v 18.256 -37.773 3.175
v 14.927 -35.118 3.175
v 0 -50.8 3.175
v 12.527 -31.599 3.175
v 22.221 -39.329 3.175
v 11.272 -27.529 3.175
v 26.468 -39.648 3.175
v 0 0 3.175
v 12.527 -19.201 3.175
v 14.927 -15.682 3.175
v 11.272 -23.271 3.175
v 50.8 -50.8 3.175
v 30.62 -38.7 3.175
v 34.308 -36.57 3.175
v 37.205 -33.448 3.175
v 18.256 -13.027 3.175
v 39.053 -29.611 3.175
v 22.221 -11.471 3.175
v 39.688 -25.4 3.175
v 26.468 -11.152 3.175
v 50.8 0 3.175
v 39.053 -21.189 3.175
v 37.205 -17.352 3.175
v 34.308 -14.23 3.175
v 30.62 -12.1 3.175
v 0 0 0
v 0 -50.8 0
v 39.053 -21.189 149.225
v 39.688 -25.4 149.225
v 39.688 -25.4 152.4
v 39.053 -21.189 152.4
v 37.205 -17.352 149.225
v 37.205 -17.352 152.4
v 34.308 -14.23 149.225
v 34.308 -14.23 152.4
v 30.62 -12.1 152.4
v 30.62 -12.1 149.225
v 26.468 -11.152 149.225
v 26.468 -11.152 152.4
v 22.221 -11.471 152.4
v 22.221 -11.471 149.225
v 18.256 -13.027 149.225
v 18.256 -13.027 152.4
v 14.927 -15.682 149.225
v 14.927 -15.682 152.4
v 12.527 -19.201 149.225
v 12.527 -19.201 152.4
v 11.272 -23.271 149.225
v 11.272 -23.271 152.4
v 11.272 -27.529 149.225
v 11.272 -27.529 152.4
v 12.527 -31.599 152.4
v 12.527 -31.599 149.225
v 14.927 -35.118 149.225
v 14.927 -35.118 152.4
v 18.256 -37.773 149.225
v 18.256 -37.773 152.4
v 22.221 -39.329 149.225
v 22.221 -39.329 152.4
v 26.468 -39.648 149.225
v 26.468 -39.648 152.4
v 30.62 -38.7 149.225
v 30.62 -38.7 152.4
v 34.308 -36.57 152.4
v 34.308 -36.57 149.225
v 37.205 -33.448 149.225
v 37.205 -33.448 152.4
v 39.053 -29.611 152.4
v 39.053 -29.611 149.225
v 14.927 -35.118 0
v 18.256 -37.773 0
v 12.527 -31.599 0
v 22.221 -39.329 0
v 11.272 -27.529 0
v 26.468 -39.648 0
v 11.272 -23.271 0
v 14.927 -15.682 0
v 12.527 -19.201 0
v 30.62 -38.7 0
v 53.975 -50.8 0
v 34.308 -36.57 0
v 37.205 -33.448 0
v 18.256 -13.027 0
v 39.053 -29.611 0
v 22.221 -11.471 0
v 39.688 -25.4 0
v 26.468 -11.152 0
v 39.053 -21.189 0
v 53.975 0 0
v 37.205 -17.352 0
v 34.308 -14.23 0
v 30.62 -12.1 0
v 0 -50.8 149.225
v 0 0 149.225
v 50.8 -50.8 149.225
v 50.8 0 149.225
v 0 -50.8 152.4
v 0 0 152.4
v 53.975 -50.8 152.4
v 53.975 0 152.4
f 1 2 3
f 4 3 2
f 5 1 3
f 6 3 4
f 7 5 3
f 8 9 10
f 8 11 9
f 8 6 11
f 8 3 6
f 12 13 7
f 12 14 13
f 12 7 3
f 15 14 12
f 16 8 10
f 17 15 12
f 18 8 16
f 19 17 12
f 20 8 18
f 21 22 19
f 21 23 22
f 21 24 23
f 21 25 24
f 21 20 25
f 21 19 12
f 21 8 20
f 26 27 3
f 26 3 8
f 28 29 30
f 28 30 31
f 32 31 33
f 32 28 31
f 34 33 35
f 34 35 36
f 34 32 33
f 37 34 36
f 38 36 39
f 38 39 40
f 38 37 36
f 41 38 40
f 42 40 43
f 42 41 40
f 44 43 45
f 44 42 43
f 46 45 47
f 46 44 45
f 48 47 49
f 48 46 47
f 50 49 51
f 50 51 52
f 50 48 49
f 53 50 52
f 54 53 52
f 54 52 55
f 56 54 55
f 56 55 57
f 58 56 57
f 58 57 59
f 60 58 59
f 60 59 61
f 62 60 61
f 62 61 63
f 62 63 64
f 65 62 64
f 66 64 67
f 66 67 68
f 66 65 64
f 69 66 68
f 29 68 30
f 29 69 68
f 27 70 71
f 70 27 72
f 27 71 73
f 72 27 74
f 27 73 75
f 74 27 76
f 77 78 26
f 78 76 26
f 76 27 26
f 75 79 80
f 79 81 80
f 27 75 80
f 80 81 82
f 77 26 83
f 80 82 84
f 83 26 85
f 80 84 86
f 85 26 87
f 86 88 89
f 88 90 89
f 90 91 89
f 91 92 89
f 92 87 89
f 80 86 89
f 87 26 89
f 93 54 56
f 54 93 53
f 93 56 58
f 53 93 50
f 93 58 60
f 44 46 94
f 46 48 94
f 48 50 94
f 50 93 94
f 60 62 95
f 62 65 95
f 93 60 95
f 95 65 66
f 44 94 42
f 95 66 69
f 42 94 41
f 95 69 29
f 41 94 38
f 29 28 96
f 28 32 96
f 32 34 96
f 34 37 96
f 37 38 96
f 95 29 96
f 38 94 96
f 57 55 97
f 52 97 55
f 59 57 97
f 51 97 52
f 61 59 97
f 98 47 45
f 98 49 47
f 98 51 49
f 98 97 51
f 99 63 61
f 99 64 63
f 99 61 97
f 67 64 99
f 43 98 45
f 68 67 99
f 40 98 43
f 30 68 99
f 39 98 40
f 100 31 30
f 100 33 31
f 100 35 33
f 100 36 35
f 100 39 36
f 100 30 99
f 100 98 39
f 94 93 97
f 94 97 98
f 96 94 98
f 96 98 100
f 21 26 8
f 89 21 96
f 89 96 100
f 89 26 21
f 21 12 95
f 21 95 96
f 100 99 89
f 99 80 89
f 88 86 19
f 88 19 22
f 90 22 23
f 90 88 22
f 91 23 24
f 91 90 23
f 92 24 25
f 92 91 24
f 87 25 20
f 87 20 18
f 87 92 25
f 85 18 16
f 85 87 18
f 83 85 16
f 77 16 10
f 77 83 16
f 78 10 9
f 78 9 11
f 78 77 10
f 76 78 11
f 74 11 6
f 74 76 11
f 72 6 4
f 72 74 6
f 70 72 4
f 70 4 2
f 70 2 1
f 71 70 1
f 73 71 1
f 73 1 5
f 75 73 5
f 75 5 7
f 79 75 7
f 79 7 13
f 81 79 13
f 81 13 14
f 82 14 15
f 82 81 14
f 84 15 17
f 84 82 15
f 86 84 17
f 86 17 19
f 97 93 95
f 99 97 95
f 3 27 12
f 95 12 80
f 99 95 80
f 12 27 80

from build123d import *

# Parameters (mm, degrees)
SKETCH1_W           = 53.975
SKETCH1_H           = 50.8
SKETCH1_R           = 14.2875
BOSS_EXTRUDE1_DEPTH = 3.175
SKETCH2_W           = 3.175
SKETCH2_H           = 50.8
BOSS_EXTRUDE2_DEPTH = 146.05
SKETCH3_W           = 3.175
SKETCH3_H           = 50.8
SKETCH3_W_2         = 50.8
SKETCH3_R           = 14.2875
BOSS_EXTRUDE3_DEPTH = 3.175


with BuildPart() as part:
    # Sketch1 → Boss-Extrude1 (new body)
    with BuildSketch(Plane.XY):
        with Locations((26.9875, -25.4)):
            Rectangle(SKETCH1_W, SKETCH1_H)
        with Locations((25.4, -25.4)):
            Circle(SKETCH1_R, mode=Mode.SUBTRACT)
    extrude(amount=BOSS_EXTRUDE1_DEPTH)

    # Sketch2 → Boss-Extrude2 (add)
    with BuildSketch(Plane.XY.offset(3.175)):
        with Locations((52.3875, -25.4)):
            Rectangle(SKETCH2_W, SKETCH2_H)
    extrude(amount=BOSS_EXTRUDE2_DEPTH)

    # Sketch3 → Boss-Extrude3 (add)
    # profile 1 of 2: a face of its own
    with BuildSketch(Plane.XY.offset(149.225)):
        with Locations((52.3875, -25.4)):
            Rectangle(SKETCH3_W, SKETCH3_H)
    # profile 2 of 2: a face of its own
    with BuildSketch(Plane.XY.offset(149.225)):
        with Locations((25.4, -25.4)):
            Rectangle(SKETCH3_W_2, SKETCH3_H)
        with Locations((25.4, -25.4)):
            Circle(SKETCH3_R, mode=Mode.SUBTRACT)
    extrude(amount=BOSS_EXTRUDE3_DEPTH)


solid = part.part
